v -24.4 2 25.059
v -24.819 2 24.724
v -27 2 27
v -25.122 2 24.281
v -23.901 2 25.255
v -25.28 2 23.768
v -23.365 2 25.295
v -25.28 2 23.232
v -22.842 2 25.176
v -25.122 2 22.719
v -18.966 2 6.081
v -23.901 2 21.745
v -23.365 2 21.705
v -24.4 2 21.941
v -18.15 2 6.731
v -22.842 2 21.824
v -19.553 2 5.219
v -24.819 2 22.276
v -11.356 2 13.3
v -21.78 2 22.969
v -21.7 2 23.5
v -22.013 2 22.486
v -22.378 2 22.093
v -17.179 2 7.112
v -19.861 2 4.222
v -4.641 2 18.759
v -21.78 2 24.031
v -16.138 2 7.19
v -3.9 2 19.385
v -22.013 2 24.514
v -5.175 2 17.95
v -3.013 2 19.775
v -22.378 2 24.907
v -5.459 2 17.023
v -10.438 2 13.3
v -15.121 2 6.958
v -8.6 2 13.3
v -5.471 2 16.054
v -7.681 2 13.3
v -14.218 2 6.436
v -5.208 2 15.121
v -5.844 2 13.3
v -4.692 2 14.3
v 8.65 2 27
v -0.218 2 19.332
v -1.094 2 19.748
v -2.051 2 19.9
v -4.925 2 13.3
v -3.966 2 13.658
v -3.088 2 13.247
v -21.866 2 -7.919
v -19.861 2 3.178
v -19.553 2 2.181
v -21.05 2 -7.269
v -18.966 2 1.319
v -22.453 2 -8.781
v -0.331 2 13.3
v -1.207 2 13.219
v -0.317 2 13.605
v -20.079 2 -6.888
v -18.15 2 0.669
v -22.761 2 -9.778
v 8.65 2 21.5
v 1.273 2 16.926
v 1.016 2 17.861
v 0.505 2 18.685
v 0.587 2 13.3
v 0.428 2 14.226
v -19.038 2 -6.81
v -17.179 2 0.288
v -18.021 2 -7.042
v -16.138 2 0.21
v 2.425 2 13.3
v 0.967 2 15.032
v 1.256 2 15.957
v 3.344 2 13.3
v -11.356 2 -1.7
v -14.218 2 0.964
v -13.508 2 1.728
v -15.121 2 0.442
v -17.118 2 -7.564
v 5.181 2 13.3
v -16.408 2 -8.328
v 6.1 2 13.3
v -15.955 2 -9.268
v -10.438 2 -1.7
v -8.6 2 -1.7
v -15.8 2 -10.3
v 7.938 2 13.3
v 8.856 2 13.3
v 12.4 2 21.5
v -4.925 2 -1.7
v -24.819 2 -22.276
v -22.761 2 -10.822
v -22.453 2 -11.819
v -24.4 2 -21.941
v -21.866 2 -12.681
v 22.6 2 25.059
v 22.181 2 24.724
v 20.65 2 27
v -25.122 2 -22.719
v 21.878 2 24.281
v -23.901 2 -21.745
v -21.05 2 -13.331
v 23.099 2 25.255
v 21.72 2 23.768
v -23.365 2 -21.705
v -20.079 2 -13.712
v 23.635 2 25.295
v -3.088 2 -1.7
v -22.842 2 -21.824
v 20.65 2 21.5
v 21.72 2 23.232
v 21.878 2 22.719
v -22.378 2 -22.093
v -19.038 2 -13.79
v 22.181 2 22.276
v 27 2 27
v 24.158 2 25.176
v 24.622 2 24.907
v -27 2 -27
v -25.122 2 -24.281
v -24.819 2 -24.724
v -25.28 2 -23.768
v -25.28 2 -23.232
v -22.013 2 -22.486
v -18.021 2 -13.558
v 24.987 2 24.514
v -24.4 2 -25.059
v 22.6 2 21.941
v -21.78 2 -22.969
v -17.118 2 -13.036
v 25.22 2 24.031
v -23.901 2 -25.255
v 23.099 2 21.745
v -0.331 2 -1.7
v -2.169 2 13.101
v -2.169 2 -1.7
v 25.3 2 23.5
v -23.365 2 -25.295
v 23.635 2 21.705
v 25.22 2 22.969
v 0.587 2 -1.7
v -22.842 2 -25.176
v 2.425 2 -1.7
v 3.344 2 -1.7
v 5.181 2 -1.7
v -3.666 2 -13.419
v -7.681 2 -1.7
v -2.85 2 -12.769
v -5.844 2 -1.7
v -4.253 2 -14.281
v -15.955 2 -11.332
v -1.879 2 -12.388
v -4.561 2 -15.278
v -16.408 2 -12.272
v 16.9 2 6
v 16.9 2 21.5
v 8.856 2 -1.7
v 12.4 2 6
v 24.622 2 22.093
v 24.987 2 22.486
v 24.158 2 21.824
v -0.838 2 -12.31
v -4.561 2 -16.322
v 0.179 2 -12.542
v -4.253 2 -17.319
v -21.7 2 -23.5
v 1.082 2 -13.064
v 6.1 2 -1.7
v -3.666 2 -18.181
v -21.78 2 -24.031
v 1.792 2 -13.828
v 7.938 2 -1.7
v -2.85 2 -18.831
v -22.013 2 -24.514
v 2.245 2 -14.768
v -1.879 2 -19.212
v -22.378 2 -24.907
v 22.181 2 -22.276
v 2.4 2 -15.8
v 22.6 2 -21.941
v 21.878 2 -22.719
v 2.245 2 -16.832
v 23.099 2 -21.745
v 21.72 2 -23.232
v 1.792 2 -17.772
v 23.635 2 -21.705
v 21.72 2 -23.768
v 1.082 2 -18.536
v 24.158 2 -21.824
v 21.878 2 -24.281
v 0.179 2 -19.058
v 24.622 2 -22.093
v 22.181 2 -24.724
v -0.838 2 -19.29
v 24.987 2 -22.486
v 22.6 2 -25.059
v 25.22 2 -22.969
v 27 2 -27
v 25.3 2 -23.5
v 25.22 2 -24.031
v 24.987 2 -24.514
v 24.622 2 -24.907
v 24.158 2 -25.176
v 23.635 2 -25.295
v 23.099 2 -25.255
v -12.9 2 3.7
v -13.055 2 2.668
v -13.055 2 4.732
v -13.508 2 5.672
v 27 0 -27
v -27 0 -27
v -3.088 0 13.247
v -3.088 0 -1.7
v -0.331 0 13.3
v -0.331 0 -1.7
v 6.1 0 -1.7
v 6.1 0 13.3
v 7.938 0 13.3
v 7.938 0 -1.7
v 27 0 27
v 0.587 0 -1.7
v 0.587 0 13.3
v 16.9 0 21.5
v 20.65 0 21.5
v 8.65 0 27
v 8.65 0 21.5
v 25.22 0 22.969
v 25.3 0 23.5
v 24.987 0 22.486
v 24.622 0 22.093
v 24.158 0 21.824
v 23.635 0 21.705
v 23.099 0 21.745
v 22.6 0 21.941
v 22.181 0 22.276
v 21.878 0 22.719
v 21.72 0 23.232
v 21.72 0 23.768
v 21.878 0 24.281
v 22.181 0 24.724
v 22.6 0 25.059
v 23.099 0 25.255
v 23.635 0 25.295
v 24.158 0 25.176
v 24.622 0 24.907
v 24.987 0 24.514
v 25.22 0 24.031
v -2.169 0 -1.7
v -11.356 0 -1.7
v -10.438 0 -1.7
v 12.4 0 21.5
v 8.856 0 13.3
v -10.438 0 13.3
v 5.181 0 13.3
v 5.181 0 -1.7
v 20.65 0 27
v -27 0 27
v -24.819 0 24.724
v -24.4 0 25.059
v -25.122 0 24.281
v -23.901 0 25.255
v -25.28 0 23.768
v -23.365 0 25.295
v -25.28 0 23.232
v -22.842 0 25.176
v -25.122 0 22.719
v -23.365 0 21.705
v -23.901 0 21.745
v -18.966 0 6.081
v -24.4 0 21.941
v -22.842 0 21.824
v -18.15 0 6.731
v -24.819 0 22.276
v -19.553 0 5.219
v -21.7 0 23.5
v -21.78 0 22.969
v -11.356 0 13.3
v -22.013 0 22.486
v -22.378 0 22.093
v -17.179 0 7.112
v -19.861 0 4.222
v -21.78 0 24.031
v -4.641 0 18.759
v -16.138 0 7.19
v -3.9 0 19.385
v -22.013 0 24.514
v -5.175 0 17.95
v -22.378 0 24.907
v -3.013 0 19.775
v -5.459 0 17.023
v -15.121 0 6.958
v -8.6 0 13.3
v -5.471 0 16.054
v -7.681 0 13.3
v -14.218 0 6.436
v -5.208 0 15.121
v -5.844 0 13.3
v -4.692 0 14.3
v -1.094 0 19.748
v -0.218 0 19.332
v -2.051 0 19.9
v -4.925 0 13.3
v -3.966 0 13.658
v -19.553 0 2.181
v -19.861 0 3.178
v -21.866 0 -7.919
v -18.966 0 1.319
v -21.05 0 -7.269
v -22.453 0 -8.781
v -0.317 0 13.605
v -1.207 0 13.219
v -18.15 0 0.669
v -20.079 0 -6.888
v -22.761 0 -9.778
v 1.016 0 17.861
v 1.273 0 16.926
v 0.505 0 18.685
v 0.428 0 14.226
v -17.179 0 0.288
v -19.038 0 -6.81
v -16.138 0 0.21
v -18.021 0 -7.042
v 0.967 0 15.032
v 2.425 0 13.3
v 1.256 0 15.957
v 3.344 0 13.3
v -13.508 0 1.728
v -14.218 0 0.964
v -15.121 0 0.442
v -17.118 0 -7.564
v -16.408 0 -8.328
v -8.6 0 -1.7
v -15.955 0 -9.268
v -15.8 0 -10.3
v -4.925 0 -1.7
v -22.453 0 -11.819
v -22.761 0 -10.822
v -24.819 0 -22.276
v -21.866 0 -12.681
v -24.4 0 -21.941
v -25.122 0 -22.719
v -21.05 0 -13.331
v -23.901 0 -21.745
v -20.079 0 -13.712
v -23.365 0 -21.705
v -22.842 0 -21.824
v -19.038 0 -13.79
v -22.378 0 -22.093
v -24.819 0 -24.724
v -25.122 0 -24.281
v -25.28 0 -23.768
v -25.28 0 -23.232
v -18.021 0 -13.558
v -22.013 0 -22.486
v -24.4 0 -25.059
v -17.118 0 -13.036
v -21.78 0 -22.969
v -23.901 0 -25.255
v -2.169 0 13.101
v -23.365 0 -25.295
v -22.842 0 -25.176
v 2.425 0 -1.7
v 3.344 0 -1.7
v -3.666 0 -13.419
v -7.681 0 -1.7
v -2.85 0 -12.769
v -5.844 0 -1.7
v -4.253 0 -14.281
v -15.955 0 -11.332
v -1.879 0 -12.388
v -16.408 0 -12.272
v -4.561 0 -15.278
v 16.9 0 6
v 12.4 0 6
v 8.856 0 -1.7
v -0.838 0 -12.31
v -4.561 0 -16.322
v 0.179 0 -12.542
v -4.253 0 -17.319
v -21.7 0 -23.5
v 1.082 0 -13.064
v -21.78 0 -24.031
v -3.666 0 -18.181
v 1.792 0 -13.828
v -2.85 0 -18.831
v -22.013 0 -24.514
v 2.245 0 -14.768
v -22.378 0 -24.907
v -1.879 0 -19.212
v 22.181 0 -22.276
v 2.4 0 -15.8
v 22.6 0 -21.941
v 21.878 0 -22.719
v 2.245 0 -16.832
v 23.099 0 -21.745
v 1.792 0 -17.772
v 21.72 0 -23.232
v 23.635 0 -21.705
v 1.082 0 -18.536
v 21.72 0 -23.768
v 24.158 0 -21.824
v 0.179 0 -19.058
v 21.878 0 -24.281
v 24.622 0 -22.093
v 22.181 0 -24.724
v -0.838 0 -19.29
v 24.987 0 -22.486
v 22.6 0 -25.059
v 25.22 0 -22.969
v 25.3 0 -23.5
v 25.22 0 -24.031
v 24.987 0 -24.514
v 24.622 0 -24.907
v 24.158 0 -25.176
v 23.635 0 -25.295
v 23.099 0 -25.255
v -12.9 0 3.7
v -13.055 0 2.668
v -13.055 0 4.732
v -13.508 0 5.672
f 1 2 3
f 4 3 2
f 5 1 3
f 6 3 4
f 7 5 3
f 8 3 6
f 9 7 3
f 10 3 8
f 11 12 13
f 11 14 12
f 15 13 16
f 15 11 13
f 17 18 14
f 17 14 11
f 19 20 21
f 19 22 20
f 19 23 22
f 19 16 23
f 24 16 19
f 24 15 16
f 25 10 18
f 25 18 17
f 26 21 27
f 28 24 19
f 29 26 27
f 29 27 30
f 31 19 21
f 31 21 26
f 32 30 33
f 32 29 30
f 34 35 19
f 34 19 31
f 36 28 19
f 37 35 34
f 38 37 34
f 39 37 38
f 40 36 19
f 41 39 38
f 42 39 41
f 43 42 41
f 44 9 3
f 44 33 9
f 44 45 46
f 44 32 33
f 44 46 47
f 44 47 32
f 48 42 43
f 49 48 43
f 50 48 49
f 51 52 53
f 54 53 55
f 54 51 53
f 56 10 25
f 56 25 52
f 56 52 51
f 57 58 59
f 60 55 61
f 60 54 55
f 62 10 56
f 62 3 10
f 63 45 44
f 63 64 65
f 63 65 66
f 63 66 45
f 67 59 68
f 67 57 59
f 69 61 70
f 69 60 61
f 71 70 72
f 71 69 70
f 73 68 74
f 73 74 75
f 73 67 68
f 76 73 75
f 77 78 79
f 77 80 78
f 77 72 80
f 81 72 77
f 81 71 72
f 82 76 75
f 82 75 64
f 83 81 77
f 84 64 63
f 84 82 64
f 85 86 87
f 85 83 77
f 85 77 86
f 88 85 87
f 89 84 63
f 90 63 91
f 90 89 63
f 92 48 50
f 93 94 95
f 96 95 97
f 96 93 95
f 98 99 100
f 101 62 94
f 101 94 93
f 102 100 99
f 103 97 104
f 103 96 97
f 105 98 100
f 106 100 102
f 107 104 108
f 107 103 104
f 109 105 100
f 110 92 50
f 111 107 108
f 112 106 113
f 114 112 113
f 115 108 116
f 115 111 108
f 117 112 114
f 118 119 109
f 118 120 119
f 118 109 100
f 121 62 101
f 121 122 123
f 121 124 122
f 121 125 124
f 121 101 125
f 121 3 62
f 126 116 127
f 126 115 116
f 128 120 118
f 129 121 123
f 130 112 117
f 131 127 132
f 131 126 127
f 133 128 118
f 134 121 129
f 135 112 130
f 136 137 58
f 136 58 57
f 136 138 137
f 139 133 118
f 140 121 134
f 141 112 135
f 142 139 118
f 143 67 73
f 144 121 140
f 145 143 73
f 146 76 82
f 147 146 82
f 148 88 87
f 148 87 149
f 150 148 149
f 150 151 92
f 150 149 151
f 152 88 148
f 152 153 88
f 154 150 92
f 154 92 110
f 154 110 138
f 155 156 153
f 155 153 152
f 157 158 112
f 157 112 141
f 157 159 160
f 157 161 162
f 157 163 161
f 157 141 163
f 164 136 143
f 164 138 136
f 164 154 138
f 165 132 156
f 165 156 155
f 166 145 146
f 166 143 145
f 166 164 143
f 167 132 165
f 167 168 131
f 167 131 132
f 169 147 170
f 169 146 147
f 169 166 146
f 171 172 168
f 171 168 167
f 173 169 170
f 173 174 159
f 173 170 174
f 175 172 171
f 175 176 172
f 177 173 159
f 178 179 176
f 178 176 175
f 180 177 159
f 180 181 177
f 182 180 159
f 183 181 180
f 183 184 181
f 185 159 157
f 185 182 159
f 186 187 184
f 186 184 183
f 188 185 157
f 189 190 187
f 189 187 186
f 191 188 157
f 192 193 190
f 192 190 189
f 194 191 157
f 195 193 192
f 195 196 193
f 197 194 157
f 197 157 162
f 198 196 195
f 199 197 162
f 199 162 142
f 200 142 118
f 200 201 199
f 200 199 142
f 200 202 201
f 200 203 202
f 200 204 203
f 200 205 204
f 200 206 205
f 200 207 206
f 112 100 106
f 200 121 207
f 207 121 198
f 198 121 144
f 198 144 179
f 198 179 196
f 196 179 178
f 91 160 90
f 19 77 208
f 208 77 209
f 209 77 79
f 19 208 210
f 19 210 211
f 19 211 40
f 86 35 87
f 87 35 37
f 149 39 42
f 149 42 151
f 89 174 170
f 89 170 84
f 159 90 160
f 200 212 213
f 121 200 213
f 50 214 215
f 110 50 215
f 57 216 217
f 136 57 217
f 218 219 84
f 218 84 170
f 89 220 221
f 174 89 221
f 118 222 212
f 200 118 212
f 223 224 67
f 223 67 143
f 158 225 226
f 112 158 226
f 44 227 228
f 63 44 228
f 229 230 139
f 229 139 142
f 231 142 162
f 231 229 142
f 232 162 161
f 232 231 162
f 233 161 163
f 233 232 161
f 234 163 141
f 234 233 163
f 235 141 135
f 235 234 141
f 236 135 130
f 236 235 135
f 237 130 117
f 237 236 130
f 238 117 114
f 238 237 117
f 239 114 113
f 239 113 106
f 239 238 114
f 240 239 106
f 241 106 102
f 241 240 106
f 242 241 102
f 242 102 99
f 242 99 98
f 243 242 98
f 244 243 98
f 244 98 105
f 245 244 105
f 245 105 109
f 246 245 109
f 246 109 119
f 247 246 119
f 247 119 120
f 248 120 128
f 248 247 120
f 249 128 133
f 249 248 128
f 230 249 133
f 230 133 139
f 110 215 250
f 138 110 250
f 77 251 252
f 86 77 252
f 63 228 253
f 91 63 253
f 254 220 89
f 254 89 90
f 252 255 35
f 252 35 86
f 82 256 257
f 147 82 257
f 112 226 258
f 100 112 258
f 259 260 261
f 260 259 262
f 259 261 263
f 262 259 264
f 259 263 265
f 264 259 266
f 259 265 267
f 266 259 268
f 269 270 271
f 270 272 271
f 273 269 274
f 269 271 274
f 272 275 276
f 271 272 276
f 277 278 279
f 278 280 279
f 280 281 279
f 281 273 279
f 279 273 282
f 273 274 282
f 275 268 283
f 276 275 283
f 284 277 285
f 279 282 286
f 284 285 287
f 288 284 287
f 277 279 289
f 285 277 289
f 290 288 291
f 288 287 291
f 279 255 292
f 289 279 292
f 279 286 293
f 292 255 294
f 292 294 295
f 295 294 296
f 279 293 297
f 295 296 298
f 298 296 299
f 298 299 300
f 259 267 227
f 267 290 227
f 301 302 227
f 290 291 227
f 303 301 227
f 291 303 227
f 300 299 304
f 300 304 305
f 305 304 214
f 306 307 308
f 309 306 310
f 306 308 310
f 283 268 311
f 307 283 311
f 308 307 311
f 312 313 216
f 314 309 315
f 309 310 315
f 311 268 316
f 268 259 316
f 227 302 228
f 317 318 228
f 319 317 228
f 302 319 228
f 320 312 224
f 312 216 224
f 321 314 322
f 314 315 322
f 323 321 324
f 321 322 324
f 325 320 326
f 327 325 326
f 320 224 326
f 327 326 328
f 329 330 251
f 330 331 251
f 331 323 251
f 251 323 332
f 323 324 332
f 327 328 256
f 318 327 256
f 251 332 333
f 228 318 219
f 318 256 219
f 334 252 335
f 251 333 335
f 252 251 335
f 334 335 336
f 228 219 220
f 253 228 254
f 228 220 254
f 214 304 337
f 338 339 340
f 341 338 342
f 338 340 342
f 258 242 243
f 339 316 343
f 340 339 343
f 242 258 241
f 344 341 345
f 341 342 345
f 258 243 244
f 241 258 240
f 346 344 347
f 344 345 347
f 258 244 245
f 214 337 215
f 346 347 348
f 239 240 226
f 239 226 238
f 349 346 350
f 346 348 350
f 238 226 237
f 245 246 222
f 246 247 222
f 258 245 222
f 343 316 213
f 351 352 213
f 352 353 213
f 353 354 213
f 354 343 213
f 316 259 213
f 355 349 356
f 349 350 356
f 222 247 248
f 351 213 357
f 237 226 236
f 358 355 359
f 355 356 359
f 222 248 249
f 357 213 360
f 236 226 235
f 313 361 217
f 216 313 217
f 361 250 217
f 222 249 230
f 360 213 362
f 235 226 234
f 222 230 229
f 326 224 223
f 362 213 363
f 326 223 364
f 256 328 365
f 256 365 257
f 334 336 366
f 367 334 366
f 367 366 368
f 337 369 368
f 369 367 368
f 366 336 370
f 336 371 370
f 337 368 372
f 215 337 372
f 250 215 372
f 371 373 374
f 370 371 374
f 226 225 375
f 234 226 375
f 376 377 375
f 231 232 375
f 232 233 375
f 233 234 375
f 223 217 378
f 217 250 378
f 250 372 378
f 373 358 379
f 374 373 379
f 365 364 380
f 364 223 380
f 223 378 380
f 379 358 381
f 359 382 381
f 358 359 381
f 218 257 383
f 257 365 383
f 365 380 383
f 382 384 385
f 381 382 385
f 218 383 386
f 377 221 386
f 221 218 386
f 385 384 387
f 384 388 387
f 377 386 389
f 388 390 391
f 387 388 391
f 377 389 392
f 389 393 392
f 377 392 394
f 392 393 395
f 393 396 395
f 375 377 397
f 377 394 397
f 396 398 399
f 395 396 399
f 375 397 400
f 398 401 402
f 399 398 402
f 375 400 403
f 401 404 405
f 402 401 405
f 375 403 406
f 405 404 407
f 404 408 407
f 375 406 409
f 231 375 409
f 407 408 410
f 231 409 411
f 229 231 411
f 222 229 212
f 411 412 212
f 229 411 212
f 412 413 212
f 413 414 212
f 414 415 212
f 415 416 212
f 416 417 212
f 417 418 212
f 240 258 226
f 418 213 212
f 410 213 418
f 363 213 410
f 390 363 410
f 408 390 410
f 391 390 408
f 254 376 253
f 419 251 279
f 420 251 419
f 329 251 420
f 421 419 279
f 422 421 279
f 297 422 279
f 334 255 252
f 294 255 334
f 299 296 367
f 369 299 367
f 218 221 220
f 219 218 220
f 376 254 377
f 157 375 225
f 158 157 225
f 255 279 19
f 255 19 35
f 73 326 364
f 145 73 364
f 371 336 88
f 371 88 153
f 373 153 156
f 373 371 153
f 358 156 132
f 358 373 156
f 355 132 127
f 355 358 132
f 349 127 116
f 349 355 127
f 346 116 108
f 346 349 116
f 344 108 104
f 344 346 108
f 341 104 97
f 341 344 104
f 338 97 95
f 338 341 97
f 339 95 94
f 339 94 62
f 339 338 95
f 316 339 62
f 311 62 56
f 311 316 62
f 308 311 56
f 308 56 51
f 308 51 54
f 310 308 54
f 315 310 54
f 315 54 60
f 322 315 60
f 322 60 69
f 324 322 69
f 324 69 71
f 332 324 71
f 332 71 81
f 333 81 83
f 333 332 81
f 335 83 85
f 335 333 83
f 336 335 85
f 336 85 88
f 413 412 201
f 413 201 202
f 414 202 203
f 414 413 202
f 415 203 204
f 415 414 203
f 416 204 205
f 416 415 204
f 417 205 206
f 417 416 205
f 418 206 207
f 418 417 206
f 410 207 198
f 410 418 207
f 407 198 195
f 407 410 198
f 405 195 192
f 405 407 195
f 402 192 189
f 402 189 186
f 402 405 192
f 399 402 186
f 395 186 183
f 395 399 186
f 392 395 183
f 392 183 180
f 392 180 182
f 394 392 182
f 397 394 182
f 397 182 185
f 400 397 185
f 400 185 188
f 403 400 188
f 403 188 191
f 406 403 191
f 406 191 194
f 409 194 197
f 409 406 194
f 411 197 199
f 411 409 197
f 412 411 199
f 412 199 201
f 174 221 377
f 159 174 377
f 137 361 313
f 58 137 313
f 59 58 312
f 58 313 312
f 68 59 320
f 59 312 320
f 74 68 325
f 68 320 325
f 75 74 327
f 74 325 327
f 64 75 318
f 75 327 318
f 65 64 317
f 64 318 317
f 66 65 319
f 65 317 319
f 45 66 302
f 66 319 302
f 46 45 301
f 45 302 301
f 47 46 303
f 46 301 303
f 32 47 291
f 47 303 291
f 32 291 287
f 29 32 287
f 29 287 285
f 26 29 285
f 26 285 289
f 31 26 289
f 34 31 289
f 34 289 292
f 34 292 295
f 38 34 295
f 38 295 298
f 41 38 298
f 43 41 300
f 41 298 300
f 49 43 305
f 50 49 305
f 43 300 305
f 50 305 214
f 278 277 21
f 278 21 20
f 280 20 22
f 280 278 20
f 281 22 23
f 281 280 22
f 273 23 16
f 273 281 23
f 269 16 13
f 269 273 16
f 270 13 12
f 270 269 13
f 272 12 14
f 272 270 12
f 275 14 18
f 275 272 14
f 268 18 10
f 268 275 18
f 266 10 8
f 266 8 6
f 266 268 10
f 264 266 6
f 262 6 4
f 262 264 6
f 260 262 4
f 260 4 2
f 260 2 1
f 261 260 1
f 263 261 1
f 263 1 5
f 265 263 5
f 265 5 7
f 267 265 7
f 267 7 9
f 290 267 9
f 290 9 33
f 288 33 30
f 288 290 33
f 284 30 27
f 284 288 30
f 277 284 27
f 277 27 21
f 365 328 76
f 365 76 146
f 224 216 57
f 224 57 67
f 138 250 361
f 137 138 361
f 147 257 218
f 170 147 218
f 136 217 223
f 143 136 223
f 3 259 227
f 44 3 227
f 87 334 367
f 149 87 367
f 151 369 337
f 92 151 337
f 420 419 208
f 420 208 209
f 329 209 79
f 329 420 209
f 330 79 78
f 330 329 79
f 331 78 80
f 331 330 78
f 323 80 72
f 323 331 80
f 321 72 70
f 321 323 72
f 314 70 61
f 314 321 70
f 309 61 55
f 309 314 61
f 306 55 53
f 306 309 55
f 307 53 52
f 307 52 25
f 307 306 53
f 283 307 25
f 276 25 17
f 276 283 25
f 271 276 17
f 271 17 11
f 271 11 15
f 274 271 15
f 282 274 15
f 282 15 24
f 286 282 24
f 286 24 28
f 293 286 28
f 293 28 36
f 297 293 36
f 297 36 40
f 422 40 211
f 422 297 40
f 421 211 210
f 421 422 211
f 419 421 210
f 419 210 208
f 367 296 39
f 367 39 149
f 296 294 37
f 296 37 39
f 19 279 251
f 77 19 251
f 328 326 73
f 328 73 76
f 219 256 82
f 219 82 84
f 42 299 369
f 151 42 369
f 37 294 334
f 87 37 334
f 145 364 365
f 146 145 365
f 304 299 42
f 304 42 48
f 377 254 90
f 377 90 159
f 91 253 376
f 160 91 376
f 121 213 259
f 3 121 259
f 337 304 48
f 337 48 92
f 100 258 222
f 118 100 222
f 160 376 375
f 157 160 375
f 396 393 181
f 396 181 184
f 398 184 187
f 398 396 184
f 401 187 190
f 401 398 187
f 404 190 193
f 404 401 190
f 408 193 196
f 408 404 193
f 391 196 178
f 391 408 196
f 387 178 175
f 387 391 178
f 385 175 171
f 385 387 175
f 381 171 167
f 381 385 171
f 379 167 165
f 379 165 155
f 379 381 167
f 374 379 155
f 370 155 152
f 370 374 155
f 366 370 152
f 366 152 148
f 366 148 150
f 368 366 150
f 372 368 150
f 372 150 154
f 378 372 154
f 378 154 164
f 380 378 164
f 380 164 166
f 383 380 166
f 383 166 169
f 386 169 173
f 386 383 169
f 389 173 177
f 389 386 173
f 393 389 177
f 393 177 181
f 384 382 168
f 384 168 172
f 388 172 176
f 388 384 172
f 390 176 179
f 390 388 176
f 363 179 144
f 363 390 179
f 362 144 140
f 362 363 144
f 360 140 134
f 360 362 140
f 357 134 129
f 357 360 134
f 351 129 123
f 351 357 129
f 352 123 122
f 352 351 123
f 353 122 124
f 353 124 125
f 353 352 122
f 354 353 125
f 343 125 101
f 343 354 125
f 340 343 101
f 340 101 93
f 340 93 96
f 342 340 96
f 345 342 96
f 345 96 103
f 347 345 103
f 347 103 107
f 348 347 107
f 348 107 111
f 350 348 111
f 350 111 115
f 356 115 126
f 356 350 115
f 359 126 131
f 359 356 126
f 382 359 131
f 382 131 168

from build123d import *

# Parameters (mm, degrees)
SKETCH_3_R      = 3.5
SKETCH_3_W      = 0.91875
SKETCH_3_H      = 15
SKETCH_3_R_2    = 1.8
EXTRUDE_2_DEPTH = 2


with BuildPart() as part:
    # 草图3 → 凸台-拉伸2 (new body)
    with BuildSketch(Plane(origin=(0, 0, 0), x_dir=(1, 0, 0), z_dir=(0, 1, 0))):
        Polygon((16.9, -21.5), (20.65, -21.5), (20.65, -27), (27, -27), (27, 27), (-27, 27), (-27, -27), (8.65, -27), (8.65, -21.5), (12.4, -21.5), (12.4, -6), (16.9, -6), align=None)
        with Locations((-19.3, 10.3)):
            Circle(SKETCH_3_R, mode=Mode.SUBTRACT)
        with Locations((-16.4, -3.7)):
            Circle(SKETCH_3_R, mode=Mode.SUBTRACT)
        with Locations((-10.896875, -5.8)):
            Rectangle(SKETCH_3_W, SKETCH_3_H, mode=Mode.SUBTRACT)
        with BuildLine():
            Line((-3.0875, -13.246564316), (-3.0875, 1.7))
            Line((-3.0875, 1.7), (-2.16875, 1.7))
            Line((-2.16875, 1.7), (-2.16875, -13.100695154))
            ThreePointArc((-2.16875, -13.100695154), (-1.566862617, -19.857940519), (-3.0875, -13.246564316))
        make_face(mode=Mode.SUBTRACT)
        with Locations((-8.140625, -5.8)):
            Rectangle(SKETCH_3_W, SKETCH_3_H, mode=Mode.SUBTRACT)
        with Locations((-5.384375, -5.8)):
            Rectangle(SKETCH_3_W, SKETCH_3_H, mode=Mode.SUBTRACT)
        with Locations((0.128125, -5.8)):
            Rectangle(SKETCH_3_W, SKETCH_3_H, mode=Mode.SUBTRACT)
        with Locations((23.5, -23.5)):
            Circle(SKETCH_3_R_2, mode=Mode.SUBTRACT)
        with Locations((2.884375, -5.8)):
            Rectangle(SKETCH_3_W, SKETCH_3_H, mode=Mode.SUBTRACT)
        with Locations((5.640625, -5.8)):
            Rectangle(SKETCH_3_W, SKETCH_3_H, mode=Mode.SUBTRACT)
        with Locations((8.396875, -5.8)):
            Rectangle(SKETCH_3_W, SKETCH_3_H, mode=Mode.SUBTRACT)
        with Locations((-1.1, 15.8)):
            Circle(SKETCH_3_R, mode=Mode.SUBTRACT)
        with Locations((23.5, 23.5)):
            Circle(SKETCH_3_R_2, mode=Mode.SUBTRACT)
        with Locations((-23.5, -23.5)):
            Circle(SKETCH_3_R_2, mode=Mode.SUBTRACT)
        with Locations((-23.5, 23.5)):
            Circle(SKETCH_3_R_2, mode=Mode.SUBTRACT)
    extrude(amount=EXTRUDE_2_DEPTH)


solid = part.part
